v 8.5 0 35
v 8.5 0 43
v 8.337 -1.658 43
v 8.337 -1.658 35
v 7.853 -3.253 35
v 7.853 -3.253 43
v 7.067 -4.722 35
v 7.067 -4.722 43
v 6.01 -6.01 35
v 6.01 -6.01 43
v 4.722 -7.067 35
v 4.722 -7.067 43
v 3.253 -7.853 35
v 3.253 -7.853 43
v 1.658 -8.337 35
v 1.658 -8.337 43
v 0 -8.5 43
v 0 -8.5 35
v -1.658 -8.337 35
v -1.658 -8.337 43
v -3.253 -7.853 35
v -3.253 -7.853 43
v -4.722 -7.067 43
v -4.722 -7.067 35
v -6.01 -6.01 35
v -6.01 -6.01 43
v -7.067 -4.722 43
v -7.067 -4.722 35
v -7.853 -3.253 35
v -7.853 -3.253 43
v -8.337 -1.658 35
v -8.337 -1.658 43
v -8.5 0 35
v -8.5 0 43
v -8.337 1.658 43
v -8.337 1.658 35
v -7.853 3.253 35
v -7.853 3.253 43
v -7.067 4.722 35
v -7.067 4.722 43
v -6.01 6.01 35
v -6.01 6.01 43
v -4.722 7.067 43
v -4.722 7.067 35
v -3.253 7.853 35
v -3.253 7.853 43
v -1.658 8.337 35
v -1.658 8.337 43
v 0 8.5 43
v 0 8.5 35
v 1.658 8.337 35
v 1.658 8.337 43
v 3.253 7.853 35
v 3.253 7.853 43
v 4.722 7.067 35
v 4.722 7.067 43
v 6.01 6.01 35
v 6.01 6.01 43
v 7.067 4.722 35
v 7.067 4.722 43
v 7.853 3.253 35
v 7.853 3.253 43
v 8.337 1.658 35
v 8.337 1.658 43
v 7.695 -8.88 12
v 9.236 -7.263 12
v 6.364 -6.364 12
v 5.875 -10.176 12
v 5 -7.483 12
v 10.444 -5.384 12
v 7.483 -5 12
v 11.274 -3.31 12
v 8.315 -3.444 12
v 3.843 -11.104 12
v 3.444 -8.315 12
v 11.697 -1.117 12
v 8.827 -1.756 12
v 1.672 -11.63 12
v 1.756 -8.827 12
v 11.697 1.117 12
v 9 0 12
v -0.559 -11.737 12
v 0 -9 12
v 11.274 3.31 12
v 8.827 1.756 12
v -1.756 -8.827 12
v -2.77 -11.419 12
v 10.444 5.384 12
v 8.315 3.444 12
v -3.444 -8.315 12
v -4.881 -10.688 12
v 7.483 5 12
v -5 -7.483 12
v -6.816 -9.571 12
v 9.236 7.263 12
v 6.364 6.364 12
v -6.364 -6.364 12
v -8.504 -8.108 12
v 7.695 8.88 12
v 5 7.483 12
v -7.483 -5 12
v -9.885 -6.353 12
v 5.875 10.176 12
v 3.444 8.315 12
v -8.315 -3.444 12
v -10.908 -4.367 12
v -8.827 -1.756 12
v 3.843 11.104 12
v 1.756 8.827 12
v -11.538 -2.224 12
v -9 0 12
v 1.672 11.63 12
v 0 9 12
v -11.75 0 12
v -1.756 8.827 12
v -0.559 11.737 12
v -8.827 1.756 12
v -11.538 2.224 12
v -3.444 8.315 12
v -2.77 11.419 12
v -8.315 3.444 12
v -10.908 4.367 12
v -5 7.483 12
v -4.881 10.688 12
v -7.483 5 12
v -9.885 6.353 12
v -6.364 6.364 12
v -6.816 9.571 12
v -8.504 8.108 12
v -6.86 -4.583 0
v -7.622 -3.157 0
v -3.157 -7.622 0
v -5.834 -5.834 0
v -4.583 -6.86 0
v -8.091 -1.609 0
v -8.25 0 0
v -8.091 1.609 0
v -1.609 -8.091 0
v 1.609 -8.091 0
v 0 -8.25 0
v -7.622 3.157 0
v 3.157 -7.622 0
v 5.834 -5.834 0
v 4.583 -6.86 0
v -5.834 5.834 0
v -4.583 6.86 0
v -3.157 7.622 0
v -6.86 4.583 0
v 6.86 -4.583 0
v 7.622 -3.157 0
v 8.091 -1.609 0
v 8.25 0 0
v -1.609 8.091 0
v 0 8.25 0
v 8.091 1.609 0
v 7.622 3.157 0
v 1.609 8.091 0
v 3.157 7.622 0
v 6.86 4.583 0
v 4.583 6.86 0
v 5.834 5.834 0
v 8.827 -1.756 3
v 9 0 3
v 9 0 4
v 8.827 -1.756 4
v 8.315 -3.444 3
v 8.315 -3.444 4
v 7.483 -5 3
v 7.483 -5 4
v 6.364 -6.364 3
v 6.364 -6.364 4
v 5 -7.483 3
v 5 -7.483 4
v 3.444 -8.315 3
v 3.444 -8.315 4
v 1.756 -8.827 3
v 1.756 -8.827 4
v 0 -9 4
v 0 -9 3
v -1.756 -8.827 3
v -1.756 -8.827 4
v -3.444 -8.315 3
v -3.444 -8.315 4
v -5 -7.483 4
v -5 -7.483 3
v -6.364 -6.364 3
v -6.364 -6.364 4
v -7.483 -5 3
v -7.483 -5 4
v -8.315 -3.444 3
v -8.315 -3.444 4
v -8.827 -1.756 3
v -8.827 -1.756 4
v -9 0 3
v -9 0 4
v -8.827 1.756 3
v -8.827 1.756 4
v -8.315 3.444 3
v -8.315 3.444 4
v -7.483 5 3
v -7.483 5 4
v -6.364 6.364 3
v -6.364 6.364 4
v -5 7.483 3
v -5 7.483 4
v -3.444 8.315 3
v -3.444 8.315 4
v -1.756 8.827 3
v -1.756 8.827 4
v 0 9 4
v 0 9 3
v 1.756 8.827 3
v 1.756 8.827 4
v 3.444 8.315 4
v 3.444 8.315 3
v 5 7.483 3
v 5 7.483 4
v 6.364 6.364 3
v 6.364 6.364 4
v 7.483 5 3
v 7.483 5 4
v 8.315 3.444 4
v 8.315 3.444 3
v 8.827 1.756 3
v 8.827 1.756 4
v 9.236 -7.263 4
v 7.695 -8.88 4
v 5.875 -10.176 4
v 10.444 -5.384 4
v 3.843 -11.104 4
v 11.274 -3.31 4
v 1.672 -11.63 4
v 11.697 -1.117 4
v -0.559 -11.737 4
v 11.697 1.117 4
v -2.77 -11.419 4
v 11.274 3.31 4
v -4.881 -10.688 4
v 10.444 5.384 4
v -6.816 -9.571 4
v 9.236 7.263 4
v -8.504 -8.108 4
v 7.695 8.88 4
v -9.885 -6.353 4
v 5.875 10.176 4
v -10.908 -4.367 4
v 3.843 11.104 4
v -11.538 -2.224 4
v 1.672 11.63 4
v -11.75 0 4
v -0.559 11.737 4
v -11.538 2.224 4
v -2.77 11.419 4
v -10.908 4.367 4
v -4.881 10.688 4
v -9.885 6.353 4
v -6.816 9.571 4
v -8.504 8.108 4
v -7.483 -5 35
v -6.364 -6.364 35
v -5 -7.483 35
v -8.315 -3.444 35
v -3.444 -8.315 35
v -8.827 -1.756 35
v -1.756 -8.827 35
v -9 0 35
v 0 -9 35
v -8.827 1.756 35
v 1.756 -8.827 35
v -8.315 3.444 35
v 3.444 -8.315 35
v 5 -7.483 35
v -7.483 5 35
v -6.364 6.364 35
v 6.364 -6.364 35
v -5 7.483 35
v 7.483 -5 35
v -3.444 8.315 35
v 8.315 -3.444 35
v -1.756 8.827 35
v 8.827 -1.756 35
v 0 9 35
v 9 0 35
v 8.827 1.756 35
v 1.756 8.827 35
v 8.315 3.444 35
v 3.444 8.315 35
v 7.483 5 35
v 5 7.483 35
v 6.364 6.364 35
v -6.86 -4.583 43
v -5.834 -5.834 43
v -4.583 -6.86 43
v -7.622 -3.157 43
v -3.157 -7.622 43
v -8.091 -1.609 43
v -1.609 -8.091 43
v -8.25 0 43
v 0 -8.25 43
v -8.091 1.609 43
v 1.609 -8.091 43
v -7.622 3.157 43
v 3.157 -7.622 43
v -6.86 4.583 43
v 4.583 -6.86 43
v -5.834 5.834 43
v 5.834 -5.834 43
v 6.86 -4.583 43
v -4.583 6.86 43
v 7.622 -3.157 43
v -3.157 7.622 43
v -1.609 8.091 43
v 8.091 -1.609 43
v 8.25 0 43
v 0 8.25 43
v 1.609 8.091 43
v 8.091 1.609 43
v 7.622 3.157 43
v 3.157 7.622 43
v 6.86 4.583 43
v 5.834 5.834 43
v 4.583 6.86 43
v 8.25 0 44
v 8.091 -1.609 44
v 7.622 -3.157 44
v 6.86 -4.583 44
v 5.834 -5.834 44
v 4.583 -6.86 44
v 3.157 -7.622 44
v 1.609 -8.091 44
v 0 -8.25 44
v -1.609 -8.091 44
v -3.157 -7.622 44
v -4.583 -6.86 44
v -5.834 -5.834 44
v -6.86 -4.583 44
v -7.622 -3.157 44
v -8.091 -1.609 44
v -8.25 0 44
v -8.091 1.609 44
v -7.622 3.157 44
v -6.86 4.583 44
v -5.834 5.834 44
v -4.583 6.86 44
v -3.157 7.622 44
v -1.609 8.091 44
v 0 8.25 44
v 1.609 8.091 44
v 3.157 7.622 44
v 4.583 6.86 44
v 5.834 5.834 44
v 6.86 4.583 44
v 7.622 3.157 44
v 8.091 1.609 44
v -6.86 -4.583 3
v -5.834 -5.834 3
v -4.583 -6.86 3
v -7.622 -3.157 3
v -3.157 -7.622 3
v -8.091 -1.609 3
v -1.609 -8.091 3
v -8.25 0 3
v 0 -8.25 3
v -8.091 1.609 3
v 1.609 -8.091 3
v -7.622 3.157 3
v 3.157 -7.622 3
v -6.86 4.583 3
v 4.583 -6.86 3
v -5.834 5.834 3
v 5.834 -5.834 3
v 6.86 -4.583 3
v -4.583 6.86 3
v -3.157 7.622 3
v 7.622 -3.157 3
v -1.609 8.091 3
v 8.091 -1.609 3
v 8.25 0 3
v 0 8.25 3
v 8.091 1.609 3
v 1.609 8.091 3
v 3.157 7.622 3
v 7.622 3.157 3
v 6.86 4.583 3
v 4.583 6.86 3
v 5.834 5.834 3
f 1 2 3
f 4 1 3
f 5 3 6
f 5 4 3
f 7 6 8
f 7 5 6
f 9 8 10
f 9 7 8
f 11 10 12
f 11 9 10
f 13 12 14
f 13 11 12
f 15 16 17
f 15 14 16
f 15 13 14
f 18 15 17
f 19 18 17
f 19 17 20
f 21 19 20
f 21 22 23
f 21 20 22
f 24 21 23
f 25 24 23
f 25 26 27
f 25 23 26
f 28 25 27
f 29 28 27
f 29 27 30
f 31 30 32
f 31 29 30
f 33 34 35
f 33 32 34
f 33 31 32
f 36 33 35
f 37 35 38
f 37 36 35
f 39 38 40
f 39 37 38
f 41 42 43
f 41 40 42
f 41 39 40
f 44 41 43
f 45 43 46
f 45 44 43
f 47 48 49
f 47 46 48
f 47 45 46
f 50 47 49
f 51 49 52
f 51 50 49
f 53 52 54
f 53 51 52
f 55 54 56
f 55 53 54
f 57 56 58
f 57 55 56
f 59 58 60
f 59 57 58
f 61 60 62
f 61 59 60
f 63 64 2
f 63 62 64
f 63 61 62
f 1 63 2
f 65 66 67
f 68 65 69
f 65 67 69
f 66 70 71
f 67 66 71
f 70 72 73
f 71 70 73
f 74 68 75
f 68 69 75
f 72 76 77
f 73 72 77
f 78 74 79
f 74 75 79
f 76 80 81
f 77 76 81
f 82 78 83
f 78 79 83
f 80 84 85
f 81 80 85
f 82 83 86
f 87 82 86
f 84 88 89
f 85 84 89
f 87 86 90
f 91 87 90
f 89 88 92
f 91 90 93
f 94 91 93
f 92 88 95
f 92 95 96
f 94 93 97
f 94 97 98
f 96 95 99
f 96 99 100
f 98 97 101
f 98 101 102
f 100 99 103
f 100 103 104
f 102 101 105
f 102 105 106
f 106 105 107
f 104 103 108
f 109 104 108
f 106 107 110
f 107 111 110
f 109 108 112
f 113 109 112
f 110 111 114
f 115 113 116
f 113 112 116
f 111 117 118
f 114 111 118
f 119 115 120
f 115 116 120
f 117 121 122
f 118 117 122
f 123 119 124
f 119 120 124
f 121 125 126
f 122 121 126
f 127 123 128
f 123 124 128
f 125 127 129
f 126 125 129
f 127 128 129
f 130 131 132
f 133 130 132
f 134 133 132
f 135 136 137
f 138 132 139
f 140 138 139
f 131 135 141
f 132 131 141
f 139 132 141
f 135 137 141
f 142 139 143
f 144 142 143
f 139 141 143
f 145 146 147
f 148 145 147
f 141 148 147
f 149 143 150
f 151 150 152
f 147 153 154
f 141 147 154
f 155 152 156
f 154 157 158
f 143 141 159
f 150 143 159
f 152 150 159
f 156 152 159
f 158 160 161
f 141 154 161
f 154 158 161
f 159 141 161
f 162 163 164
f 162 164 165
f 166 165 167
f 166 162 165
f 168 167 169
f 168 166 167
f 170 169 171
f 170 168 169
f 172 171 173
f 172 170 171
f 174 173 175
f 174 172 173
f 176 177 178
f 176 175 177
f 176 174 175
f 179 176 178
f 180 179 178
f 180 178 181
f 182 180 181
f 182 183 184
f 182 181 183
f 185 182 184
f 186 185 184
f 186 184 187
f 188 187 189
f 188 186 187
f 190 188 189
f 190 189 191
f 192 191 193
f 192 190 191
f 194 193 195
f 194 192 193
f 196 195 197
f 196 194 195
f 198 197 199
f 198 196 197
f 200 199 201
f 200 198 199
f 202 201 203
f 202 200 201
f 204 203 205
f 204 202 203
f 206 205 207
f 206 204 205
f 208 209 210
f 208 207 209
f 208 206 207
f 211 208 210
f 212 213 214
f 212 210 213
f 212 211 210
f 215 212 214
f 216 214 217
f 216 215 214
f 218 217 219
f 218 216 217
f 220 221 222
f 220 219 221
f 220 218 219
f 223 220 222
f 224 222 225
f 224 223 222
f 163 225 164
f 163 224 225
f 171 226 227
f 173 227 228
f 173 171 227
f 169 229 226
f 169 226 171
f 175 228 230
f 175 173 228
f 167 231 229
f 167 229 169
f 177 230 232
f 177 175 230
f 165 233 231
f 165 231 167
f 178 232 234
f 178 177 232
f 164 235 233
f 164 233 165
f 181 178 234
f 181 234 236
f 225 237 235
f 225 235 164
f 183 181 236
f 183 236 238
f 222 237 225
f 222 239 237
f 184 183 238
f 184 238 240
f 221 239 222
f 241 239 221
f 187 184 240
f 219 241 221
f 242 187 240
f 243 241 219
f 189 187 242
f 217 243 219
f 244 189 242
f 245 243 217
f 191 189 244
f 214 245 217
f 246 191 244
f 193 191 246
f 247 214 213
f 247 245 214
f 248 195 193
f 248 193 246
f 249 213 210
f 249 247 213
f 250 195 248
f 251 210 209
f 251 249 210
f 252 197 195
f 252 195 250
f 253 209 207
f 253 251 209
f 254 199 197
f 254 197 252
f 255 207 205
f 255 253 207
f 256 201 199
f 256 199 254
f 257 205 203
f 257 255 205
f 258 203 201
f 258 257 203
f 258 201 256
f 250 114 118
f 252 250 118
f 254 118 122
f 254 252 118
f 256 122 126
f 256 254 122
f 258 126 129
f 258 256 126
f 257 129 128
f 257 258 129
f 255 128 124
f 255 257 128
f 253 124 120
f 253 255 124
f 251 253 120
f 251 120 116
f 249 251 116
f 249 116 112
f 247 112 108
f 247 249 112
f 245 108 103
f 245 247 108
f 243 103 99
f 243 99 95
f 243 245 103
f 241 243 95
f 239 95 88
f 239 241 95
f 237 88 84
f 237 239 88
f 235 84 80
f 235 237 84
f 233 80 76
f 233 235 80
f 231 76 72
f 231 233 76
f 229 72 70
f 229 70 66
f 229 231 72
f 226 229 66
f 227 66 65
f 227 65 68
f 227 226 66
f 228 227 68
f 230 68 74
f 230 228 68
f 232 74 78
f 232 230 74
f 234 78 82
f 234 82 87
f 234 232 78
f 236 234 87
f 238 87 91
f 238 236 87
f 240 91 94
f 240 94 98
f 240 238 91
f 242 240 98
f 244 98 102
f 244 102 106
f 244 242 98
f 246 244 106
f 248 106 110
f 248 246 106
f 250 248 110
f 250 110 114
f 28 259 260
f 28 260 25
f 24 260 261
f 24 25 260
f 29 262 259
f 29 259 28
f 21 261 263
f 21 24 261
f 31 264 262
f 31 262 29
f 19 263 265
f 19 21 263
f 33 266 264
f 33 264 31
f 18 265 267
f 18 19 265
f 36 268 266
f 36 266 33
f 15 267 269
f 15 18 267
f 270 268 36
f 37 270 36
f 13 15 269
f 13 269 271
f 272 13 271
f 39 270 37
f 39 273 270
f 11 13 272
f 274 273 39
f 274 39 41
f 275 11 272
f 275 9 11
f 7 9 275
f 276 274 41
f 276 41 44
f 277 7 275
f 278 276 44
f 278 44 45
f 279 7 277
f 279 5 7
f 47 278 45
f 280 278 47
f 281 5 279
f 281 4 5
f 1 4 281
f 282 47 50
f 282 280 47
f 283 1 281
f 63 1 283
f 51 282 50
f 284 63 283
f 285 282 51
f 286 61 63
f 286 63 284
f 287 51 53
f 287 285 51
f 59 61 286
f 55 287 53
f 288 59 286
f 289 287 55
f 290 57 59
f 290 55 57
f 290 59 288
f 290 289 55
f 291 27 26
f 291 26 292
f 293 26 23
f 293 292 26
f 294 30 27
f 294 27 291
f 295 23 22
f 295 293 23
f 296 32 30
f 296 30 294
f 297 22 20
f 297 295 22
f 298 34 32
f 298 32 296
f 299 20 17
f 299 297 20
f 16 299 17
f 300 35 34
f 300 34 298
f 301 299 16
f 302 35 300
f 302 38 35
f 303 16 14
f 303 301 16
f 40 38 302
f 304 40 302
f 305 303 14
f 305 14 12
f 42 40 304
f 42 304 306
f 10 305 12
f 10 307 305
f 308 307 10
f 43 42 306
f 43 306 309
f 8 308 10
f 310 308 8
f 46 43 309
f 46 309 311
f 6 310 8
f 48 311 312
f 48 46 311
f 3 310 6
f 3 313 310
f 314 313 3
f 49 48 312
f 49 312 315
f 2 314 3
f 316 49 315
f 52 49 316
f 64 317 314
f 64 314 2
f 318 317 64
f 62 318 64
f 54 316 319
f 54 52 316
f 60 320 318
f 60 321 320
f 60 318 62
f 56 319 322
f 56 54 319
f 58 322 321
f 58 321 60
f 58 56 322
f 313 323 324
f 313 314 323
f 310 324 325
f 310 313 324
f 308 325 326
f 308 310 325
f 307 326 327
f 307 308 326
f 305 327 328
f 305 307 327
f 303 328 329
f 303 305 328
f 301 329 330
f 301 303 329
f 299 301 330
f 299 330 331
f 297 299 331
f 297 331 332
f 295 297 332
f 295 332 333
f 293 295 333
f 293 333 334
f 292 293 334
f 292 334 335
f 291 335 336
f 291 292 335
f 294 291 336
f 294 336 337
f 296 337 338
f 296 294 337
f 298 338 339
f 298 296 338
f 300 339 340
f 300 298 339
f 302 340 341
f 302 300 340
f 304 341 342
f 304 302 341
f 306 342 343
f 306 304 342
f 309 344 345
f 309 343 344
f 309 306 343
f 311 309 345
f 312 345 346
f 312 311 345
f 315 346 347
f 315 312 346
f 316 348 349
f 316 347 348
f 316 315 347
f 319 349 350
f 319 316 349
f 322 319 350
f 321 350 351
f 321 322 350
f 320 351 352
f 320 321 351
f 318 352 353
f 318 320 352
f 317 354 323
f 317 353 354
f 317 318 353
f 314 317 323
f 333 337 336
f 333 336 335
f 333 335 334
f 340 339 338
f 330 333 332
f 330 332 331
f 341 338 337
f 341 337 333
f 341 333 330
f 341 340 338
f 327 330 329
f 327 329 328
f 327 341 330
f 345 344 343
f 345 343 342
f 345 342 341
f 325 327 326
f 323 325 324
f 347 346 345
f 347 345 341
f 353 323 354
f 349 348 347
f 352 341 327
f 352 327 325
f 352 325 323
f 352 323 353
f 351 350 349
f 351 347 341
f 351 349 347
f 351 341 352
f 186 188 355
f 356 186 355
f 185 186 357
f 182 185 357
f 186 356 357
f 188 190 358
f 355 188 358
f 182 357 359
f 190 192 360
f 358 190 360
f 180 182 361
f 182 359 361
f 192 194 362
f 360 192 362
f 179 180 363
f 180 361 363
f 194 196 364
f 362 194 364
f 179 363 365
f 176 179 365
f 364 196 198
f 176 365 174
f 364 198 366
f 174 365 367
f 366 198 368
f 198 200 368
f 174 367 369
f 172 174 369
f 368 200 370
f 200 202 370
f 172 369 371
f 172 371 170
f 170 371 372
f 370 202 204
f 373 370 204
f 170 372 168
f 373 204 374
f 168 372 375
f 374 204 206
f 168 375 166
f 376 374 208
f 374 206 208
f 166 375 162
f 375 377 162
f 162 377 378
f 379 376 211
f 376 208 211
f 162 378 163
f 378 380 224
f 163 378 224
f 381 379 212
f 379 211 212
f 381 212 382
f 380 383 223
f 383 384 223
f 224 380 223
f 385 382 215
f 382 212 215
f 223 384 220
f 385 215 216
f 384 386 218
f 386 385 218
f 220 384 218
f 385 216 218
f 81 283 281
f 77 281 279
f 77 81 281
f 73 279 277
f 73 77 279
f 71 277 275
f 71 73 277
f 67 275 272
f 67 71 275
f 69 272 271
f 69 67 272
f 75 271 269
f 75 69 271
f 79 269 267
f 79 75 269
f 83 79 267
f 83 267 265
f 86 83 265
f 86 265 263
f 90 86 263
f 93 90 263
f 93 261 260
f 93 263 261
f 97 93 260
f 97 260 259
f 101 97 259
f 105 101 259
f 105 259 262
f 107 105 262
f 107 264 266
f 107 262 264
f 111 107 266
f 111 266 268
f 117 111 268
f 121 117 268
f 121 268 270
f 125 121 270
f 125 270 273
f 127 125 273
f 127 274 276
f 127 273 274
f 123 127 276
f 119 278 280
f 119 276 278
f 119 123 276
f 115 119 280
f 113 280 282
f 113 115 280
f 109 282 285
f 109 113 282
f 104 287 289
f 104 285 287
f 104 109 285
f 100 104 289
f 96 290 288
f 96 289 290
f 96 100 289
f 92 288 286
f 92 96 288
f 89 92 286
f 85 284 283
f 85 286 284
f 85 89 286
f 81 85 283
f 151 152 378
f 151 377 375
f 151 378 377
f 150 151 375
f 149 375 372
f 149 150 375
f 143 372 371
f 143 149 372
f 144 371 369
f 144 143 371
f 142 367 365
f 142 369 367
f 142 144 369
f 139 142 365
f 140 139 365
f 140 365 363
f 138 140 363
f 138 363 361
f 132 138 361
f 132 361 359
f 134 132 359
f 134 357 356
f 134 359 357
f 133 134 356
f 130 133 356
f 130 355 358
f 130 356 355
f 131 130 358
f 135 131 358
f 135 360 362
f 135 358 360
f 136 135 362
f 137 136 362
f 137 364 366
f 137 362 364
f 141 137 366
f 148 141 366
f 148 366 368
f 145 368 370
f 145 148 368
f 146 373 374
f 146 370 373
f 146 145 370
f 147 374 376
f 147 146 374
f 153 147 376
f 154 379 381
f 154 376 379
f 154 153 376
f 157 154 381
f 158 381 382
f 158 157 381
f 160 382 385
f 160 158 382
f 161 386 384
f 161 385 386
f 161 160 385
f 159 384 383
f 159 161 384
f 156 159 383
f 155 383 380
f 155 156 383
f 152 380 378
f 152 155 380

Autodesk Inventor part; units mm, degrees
ref_plane "YZ Plane" through (0, 0, 0) normal (1, 0, 0) x (0, 1, 0)
ref_plane "XZ Plane" through (0, 0, 0) normal (0, 1, 0) x (-1, 0, 0)
sketch "スケッチ1" plane through (0, 0, 0) normal (0, 0, 1) x (1, 0, 0)
  circle A0 centre (0, 0) radius 8.25
  dimension "d0" = 16.5
extrude "押し出し1" add sketch "スケッチ1" along normal blind 3
sketch "スケッチ2" plane through (0, 0, 3) normal (0, 0, 1) x (1, 0, 0)
  circle A0 centre (0, 0) radius 9
  dimension "d3" = 18
extrude "押し出し2" add sketch "スケッチ2" along normal blind 32
sketch "スケッチ3" plane through (0, 0, 35) normal (0, 0, 1) x (1, 0, 0)
  circle A0 centre (0, 0) radius 8.5
  dimension "d6" = 17
extrude "押し出し3" add sketch "スケッチ3" along normal blind 8
sketch "スケッチ4" plane through (0, 0, 43) normal (0, 0, 1) x (1, 0, 0)
  circle A0 centre (0, 0) radius 8.25
  dimension "d9" = 16.5
extrude "押し出し4" add sketch "スケッチ4" along normal blind 1
ref_plane "作業平面1" through (0, 0, 4) normal (0, 0, -1) x (-1, 0, 0)
sketch "スケッチ6" plane through (0, 0, 4) normal (0, 0, -1) x (-1, 0, 0)
  circle A0 centre (0, 0) radius 11.75
  circle A1 centre (0, 0) radius 9 projected
  dimension "d16" = 23.5
extrude "押し出し6" add sketch "スケッチ6" against normal blind 8
properties part number "E18_D80NK" material "ABS プラスチック"
